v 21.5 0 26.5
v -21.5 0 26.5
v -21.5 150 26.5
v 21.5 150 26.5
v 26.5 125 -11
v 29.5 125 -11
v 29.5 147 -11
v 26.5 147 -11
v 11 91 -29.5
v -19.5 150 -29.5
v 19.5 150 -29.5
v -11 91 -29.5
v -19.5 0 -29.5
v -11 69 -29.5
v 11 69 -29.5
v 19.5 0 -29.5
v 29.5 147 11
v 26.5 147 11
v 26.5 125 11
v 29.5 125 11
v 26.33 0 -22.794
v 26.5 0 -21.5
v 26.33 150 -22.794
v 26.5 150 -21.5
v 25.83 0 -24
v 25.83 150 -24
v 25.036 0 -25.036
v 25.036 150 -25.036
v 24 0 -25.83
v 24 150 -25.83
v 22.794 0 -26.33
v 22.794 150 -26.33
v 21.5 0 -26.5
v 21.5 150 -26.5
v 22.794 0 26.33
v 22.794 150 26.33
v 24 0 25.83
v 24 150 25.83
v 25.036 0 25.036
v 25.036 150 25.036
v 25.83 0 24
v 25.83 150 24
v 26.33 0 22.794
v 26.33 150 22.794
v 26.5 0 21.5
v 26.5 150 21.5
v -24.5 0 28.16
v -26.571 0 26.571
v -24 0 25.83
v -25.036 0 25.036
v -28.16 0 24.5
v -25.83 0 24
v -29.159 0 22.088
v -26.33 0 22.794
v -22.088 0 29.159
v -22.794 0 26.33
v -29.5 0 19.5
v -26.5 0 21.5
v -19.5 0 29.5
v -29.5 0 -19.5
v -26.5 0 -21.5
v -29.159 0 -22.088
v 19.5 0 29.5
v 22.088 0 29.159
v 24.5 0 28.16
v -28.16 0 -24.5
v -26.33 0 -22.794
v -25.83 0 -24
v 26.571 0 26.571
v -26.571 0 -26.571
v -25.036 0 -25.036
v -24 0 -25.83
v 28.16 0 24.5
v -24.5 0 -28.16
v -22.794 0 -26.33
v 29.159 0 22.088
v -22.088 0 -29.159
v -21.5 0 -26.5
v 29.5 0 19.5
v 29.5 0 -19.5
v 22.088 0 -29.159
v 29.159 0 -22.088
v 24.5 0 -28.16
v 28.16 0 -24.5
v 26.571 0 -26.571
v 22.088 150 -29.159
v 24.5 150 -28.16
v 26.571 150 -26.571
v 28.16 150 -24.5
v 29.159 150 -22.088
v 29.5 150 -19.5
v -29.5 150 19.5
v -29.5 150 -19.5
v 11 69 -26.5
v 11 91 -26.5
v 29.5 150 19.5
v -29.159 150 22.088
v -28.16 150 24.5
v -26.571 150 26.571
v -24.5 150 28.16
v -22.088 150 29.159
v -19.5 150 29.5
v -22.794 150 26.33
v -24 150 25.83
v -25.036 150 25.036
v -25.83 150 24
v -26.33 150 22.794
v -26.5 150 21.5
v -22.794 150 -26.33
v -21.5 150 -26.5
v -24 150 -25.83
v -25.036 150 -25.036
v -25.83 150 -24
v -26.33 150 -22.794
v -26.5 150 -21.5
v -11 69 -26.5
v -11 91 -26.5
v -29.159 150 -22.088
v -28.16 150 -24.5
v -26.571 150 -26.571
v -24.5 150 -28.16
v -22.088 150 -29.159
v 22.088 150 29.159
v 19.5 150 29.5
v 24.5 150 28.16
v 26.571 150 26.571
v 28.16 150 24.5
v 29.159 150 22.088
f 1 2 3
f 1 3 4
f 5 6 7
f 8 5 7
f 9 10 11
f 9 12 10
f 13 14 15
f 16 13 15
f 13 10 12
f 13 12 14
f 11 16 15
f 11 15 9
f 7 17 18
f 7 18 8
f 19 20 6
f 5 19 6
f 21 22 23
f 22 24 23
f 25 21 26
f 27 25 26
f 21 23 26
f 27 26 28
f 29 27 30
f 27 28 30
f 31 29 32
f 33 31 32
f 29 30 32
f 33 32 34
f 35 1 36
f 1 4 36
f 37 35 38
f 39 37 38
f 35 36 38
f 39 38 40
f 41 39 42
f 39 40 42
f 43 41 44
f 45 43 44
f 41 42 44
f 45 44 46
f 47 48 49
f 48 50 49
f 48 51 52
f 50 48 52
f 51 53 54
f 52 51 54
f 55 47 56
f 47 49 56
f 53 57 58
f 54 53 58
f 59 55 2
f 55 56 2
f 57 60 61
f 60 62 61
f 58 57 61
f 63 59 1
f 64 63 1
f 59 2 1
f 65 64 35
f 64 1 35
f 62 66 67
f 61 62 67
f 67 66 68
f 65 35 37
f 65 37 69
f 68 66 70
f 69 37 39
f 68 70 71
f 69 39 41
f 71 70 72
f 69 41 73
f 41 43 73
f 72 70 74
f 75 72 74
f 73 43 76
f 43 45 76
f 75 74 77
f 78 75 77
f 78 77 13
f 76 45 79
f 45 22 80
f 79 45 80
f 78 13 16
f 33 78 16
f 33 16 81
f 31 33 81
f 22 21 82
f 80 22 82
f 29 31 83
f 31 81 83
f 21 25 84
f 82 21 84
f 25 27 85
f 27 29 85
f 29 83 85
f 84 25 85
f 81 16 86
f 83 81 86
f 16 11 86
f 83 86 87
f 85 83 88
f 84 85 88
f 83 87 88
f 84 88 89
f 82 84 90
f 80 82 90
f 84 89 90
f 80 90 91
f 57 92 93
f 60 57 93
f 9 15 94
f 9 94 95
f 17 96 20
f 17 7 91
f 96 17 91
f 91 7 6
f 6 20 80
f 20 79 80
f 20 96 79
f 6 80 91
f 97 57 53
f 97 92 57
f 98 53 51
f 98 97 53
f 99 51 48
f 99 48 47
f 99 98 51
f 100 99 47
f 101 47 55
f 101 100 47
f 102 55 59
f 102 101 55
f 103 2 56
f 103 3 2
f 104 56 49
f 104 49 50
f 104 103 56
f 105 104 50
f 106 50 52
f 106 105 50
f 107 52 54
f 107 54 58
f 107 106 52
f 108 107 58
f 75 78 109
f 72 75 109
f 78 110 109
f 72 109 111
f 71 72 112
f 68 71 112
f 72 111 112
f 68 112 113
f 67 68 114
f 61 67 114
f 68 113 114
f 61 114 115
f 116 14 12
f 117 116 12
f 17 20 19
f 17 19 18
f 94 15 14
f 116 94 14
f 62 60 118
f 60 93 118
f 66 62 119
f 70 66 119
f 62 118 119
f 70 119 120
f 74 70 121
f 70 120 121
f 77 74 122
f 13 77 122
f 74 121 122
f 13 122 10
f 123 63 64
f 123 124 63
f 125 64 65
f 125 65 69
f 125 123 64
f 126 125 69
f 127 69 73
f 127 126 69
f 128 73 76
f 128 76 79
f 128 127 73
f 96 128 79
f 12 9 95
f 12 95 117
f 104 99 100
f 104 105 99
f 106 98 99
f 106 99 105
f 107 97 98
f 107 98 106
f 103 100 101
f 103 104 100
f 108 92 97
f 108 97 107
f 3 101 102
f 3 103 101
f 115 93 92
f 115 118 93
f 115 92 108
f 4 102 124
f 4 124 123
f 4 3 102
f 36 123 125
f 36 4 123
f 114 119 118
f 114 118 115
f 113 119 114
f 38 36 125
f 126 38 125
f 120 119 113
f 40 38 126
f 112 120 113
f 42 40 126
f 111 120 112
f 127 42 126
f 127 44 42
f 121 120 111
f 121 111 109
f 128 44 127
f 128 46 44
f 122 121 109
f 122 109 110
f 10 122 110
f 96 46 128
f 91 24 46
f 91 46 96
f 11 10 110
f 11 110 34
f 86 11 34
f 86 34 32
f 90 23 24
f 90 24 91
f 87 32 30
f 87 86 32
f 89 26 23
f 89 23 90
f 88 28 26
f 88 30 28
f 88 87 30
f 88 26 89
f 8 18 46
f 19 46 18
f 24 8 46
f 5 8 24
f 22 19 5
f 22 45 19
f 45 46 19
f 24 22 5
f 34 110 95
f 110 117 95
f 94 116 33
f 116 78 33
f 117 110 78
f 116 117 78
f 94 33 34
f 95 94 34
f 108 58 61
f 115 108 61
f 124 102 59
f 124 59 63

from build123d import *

# Parameters (mm, degrees)
SKETCH1_W           = 59
SKETCH1_H           = 59
SKETCH1_W_2         = 53
SKETCH1_H_2         = 53
BOSS_EXTRUDE1_DEPTH = 150
FILLET1_R           = 10
FILLET2_R           = 5
SKETCH3_W           = 22
SKETCH3_H           = 22
CUT_EXTRUDE2_DEPTH  = 3
CUT_EXTRUDE4_REACH  = 165.864
SKETCH5_W           = 22
SKETCH5_H           = 22


with BuildPart() as part:
    # Sketch1 → Boss-Extrude1 (new body)
    with BuildSketch(Plane(origin=(0, 0, 0), x_dir=(1, 0, 0), z_dir=(0, 1, 0))):
        Rectangle(SKETCH1_W, SKETCH1_H)
        Rectangle(SKETCH1_W_2, SKETCH1_H_2, mode=Mode.SUBTRACT)
    extrude(amount=BOSS_EXTRUDE1_DEPTH)

    # Fillet1
    fillet1_edges = [part.edges().sort_by_distance(p)[0] for p in [
        (29.5, 75, 29.5),
        (-29.5, 75, 29.5),
        (-29.5, 75, -29.5),
        (29.5, 75, -29.5),
    ]]
    fillet(fillet1_edges, radius=FILLET1_R)

    # Fillet2
    fillet2_edges = [part.edges().sort_by_distance(p)[0] for p in [
        (26.5, 75, 26.5),
        (26.5, 75, -26.5),
        (-26.5, 75, -26.5),
        (-26.5, 75, 26.5),
    ]]
    fillet(fillet2_edges, radius=FILLET2_R)

    # Sketch3 → Cut-Extrude2 (cut)
    with BuildSketch(Plane(origin=(0, 0, -29.5), x_dir=(-1, 0, 0), z_dir=(0, 0, -1))):
        with Locations((0, 80)):
            Rectangle(SKETCH3_W, SKETCH3_H)
    extrude(amount=-CUT_EXTRUDE2_DEPTH, mode=Mode.SUBTRACT)

    # Sketch5 → Cut-Extrude4 (cut, up to next)
    with BuildSketch(Plane(origin=(29.5, 0, 0), x_dir=(0, 0, -1), z_dir=(1, 0, 0)), mode=Mode.PRIVATE) as cut_extrude4_sk1:
        with Locations((0, 136)):
            Rectangle(SKETCH5_W, SKETCH5_H)
    cut_extrude4_tool1 = extrude(cut_extrude4_sk1.sketch, amount=-CUT_EXTRUDE4_REACH, mode=Mode.PRIVATE) & part.part
    add(cut_extrude4_tool1.solids().sort_by_distance((29.5, 136, 0))[0], mode=Mode.SUBTRACT)


solid = part.part
